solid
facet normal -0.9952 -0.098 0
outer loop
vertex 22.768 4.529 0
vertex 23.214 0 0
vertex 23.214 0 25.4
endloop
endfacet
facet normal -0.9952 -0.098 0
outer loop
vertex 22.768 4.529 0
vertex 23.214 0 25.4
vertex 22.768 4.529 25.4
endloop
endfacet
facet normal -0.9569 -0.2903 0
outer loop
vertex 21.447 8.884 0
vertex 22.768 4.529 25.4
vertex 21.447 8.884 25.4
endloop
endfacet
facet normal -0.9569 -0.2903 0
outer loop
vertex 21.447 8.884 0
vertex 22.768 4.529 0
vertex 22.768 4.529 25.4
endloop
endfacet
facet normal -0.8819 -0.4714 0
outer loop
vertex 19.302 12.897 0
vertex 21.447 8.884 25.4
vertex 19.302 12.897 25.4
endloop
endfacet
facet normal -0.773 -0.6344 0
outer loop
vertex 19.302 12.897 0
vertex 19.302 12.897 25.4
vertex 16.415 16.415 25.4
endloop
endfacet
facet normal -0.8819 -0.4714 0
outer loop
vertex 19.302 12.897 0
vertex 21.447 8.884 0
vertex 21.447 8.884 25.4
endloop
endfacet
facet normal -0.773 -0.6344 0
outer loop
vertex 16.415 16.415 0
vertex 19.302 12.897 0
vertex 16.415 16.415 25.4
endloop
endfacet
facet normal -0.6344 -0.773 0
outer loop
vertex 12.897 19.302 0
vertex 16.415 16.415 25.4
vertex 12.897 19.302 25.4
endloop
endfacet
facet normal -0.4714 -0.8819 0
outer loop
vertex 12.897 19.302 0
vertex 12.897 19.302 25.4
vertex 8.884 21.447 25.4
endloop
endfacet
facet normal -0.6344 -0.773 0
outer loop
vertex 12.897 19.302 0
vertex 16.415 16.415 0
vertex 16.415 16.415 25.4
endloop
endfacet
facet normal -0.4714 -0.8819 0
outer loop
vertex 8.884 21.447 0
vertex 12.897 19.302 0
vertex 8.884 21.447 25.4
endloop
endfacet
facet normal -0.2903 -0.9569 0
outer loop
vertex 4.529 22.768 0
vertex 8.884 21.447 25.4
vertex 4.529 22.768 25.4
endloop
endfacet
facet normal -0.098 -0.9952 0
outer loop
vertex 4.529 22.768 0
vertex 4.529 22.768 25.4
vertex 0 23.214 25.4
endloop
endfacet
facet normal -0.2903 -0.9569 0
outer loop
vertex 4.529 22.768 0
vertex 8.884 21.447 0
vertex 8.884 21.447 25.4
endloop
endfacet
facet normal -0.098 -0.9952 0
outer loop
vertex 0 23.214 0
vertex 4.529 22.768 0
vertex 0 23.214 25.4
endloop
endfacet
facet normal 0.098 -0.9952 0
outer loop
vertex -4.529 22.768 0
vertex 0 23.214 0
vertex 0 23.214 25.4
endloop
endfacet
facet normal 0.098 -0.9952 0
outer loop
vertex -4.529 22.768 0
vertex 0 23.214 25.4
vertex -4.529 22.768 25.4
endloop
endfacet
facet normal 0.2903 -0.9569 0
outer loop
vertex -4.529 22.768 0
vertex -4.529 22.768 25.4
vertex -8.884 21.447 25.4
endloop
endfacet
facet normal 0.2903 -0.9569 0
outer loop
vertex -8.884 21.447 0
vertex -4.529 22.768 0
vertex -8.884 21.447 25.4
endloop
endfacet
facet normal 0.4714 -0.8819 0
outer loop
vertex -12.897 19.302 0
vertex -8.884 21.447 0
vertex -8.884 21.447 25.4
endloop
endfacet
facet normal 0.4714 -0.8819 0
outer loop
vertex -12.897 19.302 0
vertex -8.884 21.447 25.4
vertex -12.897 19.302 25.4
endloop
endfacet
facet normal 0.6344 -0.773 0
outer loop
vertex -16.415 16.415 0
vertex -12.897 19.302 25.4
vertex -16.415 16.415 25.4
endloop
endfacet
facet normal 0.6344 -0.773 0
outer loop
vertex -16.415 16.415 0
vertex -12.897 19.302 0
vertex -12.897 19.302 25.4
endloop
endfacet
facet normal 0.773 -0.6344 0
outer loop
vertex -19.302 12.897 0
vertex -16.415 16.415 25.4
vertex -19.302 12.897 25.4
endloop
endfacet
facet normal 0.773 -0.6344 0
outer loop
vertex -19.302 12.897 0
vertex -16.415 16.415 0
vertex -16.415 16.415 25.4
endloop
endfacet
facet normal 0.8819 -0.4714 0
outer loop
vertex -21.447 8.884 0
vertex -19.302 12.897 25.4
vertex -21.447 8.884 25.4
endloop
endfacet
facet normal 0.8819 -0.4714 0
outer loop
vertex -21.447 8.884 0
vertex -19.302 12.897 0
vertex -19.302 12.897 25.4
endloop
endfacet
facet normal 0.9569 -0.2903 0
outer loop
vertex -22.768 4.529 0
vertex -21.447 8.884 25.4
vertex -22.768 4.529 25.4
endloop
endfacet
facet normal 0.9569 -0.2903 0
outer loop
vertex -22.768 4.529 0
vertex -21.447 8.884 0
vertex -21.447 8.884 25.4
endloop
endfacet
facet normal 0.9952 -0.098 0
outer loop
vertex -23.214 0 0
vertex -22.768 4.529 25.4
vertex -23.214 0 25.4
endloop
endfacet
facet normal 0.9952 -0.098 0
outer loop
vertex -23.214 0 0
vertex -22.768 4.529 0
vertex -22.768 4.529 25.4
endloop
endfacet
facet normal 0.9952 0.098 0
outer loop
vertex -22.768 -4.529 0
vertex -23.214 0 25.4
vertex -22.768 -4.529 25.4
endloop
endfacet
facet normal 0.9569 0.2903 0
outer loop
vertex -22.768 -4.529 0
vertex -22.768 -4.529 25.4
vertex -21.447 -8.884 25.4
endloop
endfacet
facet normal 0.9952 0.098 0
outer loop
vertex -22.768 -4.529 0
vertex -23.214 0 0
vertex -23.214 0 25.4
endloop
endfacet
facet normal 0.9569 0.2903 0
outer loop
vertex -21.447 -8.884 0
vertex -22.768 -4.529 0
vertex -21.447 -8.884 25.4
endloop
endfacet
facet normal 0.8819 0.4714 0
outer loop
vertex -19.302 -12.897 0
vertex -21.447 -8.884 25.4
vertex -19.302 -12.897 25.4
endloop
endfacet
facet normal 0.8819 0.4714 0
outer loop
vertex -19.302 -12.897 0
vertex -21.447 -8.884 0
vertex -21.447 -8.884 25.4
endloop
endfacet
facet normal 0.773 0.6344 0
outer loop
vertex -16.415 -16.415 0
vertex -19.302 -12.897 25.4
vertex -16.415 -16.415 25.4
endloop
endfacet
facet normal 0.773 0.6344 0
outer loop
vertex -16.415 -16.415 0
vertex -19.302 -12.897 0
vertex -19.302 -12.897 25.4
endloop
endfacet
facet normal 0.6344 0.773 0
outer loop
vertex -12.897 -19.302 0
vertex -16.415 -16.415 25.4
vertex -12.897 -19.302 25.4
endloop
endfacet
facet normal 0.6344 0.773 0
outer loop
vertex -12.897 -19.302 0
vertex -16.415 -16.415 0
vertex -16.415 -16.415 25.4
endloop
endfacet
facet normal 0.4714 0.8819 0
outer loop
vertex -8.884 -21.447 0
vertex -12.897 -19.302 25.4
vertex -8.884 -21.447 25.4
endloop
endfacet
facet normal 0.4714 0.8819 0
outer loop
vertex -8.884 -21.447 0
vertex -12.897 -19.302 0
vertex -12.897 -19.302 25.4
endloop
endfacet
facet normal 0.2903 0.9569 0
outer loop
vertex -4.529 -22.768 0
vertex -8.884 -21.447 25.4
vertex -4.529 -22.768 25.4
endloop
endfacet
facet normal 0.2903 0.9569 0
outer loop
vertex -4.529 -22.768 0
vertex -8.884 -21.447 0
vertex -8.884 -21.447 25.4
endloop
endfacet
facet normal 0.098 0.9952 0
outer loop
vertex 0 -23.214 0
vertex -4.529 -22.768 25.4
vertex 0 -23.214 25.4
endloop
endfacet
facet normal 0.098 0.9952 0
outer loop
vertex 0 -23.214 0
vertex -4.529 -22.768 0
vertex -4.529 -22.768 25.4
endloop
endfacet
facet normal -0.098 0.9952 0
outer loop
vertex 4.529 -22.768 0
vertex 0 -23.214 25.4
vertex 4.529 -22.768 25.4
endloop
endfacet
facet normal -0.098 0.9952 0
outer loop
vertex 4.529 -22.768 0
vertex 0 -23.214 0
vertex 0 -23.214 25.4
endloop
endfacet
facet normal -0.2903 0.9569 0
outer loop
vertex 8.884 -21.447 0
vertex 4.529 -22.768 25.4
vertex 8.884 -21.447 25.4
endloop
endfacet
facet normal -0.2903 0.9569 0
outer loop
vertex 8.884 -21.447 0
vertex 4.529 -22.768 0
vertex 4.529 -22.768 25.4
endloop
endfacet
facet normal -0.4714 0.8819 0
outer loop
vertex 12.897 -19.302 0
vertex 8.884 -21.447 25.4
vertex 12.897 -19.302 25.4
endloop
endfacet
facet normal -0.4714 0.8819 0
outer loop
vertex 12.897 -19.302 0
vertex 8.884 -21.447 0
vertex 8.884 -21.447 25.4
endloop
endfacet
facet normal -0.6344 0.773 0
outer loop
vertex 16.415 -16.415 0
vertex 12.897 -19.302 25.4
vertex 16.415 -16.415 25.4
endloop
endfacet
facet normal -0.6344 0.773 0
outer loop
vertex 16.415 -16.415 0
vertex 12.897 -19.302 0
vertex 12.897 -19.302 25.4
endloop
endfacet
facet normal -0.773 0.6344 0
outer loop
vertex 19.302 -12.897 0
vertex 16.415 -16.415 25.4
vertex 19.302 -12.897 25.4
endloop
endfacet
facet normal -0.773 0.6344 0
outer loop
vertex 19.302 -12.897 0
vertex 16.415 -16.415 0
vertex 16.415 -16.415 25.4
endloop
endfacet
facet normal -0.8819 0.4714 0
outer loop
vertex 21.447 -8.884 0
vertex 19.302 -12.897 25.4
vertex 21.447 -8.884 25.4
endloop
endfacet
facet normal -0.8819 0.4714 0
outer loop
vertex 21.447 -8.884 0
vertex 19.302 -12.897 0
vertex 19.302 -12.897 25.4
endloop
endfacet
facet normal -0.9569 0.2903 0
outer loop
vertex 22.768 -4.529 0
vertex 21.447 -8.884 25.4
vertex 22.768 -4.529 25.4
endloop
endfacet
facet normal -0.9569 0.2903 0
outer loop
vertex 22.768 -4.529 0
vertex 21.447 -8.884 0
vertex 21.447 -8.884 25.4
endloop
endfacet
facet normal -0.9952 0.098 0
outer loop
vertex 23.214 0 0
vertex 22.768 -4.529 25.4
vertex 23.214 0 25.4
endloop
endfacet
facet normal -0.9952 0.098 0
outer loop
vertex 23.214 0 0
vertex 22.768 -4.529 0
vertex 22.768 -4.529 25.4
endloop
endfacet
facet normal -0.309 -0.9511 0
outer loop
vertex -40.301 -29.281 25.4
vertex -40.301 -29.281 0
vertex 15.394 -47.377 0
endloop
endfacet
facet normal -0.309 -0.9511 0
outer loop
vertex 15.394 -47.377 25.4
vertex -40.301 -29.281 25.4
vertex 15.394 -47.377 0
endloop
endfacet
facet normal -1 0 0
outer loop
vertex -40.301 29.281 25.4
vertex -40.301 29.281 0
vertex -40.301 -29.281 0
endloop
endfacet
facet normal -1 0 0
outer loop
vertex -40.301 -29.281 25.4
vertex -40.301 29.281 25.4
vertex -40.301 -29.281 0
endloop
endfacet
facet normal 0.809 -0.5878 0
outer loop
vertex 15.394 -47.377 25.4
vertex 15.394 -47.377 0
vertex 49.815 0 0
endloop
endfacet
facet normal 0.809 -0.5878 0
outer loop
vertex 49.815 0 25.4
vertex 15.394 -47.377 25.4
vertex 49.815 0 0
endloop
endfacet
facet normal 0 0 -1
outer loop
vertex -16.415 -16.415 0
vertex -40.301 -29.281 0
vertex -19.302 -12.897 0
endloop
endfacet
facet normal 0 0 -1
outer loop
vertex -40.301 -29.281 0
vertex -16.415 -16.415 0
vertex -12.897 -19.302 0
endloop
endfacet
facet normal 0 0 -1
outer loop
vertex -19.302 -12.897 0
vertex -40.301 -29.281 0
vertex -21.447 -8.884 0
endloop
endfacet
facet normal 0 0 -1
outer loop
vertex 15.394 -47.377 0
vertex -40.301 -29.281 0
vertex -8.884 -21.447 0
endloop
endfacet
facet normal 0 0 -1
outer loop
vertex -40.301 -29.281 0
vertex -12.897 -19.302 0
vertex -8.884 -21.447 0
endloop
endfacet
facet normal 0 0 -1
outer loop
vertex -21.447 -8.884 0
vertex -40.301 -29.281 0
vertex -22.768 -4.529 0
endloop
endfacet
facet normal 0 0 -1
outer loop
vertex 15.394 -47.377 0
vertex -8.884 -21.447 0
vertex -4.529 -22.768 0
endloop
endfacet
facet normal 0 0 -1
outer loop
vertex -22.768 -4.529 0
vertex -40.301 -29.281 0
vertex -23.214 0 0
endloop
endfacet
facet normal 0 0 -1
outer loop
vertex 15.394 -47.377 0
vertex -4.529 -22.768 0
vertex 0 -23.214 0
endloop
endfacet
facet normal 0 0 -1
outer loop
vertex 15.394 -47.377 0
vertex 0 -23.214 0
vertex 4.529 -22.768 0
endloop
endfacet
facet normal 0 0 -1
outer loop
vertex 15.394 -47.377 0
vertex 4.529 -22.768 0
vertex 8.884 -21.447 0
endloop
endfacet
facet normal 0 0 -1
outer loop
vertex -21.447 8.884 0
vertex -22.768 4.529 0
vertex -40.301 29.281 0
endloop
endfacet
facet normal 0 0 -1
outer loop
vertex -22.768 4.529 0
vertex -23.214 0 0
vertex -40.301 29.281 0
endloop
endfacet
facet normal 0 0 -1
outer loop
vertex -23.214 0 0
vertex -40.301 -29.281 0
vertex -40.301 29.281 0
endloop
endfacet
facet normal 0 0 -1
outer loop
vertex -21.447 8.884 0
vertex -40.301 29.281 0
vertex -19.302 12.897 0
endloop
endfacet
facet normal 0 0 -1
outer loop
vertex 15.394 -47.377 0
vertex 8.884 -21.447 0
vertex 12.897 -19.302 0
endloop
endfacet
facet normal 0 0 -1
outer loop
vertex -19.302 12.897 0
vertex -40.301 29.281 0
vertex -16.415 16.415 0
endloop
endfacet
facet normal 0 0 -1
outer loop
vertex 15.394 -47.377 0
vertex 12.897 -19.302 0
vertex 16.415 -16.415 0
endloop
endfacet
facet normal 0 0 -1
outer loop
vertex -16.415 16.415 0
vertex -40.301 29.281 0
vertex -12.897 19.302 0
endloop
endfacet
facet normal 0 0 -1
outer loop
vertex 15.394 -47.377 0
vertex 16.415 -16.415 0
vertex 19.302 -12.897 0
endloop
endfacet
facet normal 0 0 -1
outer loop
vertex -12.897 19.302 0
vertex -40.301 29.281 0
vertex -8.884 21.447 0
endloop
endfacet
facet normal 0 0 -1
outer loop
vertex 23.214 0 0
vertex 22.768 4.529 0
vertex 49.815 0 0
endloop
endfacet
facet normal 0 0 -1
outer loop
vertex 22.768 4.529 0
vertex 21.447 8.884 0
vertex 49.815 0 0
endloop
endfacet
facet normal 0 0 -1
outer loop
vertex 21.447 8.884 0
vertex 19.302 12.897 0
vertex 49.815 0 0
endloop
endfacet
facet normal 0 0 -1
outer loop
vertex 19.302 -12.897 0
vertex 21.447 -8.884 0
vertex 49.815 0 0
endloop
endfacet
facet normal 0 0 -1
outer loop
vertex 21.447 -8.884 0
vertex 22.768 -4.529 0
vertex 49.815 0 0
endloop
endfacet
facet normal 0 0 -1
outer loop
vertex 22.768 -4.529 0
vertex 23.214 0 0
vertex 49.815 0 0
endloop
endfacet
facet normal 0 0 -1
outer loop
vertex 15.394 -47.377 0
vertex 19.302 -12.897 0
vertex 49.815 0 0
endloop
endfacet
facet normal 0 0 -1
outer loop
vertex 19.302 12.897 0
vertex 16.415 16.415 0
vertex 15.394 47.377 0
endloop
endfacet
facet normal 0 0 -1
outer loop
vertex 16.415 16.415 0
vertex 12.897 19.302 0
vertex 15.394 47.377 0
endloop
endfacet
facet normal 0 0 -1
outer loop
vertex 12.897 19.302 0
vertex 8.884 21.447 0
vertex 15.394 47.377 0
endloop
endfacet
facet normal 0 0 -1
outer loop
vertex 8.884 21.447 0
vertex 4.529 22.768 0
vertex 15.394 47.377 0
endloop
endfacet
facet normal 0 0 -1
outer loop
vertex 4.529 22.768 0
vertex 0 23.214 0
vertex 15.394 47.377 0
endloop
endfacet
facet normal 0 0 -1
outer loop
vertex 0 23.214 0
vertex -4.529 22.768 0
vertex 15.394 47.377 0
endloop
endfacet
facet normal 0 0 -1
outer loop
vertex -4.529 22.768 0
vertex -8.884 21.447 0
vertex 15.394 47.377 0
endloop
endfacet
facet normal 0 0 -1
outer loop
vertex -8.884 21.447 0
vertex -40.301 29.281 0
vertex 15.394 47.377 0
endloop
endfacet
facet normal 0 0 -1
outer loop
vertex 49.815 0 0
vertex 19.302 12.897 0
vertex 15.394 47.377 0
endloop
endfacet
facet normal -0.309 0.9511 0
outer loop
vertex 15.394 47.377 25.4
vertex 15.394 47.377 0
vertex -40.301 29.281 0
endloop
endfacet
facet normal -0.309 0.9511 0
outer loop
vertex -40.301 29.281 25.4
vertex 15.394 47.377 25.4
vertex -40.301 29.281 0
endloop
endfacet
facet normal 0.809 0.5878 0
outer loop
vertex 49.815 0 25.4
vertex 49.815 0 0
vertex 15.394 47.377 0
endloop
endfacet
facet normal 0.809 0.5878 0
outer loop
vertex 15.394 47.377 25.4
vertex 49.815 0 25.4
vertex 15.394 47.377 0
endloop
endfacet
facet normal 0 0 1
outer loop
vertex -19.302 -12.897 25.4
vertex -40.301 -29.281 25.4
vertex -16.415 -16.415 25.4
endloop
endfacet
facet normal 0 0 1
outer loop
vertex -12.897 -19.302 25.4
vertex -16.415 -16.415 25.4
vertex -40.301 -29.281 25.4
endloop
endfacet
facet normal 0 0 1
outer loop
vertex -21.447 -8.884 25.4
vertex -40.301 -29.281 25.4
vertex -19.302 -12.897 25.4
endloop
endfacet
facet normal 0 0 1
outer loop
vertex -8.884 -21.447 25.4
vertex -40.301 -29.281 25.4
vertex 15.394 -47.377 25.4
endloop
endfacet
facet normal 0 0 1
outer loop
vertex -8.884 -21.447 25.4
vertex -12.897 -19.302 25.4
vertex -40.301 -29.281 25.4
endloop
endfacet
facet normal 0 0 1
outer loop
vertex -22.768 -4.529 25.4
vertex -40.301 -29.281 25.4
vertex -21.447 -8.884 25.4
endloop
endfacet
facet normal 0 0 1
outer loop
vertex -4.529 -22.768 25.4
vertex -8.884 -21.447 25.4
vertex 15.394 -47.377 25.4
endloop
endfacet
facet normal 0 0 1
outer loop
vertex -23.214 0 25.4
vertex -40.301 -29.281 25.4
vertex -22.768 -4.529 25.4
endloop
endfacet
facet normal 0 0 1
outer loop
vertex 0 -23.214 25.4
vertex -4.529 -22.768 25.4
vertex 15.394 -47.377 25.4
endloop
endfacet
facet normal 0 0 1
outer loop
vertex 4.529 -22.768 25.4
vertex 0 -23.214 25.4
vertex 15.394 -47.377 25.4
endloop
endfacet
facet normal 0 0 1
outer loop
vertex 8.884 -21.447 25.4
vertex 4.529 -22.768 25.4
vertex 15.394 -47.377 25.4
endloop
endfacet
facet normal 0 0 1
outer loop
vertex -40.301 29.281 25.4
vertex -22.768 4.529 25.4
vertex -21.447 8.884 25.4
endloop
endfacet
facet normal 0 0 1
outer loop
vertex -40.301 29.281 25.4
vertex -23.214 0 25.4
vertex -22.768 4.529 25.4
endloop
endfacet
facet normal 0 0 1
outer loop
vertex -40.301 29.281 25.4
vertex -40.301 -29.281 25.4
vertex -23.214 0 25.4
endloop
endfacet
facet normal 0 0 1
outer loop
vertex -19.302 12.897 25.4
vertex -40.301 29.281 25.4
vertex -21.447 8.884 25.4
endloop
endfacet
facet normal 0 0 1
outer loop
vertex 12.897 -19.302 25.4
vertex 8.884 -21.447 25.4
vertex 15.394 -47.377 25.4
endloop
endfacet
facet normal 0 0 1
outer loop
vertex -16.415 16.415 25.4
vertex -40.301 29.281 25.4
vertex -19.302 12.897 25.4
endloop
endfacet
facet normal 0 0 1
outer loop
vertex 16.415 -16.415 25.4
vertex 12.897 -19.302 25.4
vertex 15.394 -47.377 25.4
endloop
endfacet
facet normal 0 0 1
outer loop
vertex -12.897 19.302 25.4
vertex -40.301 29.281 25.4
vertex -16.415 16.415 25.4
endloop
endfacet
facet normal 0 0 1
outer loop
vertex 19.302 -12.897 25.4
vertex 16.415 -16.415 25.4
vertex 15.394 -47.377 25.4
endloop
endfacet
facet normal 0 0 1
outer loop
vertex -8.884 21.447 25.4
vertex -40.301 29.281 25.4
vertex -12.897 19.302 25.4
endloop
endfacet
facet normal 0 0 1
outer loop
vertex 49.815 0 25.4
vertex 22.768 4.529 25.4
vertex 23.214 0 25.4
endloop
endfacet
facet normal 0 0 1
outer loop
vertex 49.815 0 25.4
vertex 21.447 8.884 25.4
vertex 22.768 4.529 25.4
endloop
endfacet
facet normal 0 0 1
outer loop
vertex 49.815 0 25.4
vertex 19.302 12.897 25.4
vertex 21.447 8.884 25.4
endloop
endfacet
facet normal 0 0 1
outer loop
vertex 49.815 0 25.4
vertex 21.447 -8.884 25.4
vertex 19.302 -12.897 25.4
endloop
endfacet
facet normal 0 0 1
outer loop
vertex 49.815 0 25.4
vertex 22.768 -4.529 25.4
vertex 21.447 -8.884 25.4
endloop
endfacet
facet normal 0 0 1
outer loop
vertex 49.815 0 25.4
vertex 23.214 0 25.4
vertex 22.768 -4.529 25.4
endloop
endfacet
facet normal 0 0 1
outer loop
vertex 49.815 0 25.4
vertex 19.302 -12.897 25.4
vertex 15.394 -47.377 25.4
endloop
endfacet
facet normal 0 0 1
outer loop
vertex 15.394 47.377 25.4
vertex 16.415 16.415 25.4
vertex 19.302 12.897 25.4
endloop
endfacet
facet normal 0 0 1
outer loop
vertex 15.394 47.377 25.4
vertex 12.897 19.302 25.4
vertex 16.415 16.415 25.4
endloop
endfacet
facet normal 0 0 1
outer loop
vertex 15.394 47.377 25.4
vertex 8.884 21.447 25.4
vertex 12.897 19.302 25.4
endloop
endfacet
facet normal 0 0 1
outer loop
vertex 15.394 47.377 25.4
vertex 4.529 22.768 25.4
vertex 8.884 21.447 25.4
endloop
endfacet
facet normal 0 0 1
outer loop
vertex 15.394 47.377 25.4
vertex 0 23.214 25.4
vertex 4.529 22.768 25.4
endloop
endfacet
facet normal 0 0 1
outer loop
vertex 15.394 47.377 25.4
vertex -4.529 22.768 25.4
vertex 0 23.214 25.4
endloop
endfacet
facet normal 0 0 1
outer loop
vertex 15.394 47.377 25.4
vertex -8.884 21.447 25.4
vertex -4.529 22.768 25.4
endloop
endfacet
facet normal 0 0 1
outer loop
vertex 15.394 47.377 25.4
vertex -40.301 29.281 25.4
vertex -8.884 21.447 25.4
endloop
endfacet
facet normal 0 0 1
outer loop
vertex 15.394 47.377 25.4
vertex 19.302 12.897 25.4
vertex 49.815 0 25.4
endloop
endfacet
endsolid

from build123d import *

# Parameters (mm, degrees)
F0_R     = 23.214461
F1_DEPTH = 25.4


with BuildPart() as f1:
    # F0 (on Top) → F1 (new body)
    with BuildSketch(Plane.XY):
        Polygon((-40.301334, 29.280633), (-40.301334, -29.280633), (15.39374, -47.37706), (49.815189, 0), (15.39374, 47.37706), align=None)
        Circle(F0_R, mode=Mode.SUBTRACT)
    extrude(amount=F1_DEPTH)


solid = f1.part
